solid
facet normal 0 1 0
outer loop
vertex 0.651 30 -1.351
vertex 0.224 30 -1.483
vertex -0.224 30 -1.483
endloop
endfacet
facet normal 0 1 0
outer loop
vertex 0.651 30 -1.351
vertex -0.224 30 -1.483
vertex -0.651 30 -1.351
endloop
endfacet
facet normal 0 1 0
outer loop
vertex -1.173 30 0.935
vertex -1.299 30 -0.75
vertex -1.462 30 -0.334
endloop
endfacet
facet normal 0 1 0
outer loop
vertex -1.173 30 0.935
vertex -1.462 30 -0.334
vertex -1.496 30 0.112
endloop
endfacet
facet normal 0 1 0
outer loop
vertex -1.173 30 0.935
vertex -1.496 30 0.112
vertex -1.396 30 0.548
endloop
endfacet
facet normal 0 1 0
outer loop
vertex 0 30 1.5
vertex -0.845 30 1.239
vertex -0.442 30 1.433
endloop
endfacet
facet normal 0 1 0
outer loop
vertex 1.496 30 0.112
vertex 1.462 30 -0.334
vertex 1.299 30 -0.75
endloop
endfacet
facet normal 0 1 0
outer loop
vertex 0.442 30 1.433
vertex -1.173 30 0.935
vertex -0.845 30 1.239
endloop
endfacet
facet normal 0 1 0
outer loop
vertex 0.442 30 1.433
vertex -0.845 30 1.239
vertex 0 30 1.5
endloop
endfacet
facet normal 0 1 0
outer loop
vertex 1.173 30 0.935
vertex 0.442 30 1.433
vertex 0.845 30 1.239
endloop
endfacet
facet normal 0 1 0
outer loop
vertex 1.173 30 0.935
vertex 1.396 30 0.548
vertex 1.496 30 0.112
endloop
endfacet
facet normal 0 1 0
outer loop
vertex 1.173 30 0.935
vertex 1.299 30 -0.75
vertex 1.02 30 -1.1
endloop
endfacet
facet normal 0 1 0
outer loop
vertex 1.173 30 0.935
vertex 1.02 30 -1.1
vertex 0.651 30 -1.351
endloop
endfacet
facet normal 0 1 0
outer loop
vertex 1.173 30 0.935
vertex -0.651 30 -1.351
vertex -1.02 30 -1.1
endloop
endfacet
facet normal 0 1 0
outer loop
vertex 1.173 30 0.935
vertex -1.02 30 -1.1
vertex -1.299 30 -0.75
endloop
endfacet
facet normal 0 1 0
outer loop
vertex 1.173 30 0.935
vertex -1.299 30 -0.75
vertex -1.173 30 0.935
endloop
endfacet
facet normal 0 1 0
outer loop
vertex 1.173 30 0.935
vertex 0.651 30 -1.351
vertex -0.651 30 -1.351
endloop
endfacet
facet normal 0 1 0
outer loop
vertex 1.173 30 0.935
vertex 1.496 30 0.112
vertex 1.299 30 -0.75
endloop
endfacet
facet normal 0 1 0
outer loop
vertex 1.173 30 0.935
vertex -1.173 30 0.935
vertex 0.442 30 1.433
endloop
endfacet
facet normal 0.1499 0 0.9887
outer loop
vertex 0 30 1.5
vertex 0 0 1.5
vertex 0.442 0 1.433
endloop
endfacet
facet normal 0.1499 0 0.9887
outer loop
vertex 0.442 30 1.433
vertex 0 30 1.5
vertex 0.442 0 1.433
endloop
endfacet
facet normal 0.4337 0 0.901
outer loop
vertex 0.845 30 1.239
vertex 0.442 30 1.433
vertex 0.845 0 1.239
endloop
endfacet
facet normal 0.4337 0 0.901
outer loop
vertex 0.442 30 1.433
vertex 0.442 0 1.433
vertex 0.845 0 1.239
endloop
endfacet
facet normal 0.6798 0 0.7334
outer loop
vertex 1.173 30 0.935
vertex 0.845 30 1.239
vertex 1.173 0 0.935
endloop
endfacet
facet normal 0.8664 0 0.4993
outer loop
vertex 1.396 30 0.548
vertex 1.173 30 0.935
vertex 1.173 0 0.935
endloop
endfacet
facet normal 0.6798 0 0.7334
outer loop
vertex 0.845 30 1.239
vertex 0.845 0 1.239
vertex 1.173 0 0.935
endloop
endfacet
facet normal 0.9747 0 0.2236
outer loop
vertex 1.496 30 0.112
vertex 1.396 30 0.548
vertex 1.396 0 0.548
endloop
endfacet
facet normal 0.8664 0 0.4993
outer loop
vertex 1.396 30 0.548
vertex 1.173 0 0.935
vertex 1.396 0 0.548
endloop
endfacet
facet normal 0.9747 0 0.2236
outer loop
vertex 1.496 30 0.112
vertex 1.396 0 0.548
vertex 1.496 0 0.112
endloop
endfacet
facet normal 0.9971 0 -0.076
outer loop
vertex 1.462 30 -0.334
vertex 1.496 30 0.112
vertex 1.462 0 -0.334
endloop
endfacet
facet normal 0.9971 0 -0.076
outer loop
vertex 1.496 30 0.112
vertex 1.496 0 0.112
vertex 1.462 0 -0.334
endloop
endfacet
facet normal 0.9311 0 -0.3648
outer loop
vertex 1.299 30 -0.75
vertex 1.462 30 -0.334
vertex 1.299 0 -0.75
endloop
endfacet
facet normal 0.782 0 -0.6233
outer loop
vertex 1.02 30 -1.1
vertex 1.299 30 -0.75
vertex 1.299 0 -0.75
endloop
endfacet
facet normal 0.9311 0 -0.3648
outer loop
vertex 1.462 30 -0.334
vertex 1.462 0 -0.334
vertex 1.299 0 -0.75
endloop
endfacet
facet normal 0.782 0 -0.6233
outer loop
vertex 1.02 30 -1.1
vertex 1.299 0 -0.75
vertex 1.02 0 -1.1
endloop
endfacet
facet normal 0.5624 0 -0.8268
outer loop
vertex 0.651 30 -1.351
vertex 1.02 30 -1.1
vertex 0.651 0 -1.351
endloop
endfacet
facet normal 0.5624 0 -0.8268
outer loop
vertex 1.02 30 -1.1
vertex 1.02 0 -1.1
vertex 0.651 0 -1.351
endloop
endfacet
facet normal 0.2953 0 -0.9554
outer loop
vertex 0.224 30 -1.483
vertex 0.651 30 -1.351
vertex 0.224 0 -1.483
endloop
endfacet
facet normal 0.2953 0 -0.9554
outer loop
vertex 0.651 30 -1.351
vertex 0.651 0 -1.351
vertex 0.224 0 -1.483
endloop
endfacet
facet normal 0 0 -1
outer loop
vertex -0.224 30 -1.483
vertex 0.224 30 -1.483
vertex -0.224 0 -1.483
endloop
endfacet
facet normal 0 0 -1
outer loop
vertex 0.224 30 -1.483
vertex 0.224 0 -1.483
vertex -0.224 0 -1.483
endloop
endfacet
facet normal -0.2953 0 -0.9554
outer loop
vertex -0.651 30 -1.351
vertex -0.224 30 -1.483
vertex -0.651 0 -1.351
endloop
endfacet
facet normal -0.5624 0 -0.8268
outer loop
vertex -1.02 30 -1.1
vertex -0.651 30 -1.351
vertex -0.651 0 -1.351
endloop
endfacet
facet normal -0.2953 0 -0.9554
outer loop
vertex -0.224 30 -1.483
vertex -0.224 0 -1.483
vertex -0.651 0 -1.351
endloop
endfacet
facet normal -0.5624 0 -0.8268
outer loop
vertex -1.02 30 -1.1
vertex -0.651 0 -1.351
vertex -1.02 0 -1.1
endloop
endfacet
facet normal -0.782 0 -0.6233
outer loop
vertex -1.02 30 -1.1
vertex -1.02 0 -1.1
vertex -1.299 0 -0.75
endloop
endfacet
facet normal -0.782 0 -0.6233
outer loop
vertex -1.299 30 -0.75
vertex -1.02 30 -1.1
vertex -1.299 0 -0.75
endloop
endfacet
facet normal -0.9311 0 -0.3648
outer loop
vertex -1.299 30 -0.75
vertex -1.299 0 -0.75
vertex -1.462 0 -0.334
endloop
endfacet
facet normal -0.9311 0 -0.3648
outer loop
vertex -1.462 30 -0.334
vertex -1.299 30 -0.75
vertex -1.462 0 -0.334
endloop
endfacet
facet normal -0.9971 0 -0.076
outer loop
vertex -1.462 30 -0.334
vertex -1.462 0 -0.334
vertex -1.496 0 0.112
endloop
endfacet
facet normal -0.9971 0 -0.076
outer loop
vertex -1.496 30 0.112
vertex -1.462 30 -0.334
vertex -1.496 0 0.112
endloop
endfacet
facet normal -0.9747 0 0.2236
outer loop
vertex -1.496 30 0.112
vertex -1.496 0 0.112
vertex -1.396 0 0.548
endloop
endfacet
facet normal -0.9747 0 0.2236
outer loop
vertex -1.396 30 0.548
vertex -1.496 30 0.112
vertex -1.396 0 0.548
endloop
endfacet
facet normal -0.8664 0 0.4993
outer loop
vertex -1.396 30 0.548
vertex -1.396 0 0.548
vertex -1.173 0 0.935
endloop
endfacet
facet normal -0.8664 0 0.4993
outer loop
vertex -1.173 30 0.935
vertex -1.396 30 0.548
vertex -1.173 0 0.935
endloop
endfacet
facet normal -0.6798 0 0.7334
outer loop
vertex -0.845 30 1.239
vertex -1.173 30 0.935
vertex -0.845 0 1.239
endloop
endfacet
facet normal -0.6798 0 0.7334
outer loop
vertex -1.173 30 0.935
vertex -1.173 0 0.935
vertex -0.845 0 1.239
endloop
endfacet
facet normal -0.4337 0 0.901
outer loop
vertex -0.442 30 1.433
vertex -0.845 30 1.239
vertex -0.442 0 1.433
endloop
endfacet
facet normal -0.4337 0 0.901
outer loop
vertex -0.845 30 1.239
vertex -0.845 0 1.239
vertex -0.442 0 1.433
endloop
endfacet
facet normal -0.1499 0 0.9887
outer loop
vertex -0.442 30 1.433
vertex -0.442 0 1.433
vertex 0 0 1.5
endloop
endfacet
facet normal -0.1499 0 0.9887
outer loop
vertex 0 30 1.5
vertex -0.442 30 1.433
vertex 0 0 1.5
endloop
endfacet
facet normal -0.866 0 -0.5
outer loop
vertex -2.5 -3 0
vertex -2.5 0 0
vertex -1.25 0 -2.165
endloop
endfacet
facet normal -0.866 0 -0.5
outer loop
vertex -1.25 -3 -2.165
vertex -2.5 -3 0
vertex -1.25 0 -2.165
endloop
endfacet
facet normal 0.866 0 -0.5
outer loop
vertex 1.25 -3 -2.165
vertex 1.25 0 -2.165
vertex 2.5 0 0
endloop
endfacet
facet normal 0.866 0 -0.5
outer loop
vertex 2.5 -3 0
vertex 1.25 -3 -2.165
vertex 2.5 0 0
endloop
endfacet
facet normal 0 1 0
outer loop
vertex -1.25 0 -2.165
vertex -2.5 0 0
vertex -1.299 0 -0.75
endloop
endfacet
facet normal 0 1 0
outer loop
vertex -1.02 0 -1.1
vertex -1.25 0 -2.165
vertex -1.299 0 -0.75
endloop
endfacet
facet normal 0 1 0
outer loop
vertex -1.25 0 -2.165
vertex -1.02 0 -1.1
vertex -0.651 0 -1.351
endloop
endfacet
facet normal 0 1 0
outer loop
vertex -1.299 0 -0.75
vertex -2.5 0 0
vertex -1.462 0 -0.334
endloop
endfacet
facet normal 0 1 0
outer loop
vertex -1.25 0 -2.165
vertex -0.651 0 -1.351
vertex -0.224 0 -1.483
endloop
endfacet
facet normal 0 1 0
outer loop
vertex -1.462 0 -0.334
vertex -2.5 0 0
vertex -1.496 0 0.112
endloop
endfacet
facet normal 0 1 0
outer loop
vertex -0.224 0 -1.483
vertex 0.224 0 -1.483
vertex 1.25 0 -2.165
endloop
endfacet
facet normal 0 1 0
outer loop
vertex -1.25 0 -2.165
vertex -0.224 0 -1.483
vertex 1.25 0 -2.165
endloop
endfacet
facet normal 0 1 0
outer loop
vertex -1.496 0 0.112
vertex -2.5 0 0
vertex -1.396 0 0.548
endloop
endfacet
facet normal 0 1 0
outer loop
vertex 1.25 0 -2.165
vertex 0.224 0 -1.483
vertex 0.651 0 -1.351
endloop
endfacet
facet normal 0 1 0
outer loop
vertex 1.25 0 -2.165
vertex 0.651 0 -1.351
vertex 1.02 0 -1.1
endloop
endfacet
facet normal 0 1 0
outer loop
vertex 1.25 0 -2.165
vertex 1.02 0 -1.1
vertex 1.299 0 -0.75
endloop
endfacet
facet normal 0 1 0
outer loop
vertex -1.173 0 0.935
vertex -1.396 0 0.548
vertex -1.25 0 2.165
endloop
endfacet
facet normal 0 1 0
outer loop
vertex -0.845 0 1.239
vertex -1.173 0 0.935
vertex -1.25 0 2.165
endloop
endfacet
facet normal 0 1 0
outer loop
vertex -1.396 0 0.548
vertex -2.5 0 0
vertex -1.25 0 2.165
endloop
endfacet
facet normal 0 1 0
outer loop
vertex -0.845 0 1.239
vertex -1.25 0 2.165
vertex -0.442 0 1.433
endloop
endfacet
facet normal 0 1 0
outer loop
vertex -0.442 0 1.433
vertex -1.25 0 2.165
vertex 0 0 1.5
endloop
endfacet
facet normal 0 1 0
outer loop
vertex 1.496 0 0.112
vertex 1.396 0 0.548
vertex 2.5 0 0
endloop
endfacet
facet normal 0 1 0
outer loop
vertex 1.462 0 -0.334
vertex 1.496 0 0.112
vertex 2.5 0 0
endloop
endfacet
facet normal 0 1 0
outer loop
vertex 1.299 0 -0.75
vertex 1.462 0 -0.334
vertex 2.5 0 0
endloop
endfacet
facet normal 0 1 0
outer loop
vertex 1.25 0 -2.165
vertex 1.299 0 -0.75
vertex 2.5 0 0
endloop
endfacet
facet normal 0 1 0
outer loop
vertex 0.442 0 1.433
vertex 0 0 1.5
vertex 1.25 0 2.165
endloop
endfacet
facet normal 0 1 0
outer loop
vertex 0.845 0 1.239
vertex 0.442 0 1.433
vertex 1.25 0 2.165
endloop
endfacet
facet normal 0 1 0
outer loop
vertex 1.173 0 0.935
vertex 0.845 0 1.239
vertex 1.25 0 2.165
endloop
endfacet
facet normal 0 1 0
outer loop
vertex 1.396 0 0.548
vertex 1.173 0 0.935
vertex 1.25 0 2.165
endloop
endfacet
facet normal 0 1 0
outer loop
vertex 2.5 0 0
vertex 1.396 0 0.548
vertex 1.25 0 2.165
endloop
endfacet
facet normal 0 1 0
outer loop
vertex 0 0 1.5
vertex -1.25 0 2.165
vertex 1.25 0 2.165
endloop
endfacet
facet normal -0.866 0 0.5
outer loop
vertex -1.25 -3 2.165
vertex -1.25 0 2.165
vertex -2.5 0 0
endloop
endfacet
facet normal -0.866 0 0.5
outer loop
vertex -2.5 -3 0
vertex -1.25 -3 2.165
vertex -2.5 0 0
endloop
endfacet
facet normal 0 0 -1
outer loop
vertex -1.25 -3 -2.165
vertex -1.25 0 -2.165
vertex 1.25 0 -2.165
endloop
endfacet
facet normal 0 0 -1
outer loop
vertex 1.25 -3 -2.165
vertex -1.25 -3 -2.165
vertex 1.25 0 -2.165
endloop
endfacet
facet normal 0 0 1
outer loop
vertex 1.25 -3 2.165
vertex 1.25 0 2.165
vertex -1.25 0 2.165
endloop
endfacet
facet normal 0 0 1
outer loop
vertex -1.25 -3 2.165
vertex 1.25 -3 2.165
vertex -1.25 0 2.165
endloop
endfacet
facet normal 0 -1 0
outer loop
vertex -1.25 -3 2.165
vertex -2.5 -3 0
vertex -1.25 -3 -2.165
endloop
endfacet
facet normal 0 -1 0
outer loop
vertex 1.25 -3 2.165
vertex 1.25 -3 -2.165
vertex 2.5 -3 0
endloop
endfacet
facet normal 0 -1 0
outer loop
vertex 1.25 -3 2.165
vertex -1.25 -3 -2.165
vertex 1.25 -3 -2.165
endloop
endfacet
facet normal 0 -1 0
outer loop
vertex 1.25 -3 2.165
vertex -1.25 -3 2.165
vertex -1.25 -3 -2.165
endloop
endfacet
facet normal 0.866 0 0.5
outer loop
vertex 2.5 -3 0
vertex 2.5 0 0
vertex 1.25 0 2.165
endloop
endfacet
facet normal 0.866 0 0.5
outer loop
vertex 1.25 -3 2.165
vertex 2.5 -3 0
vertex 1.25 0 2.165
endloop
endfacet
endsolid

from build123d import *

# Parameters (mm, degrees)
SKETCH1_R           = 1.5
BOSS_EXTRUDE1_DEPTH = 30
BOSS_EXTRUDE2_DEPTH = 3


with BuildPart() as part:
    # Sketch1 → Boss-Extrude1 (new body)
    with BuildSketch(Plane(origin=(0, 0, 0), x_dir=(1, 0, 0), z_dir=(0, 1, 0))):
        with Locations(Location((0, 0, 0), (0, 0, 270))):
            Circle(SKETCH1_R)
    extrude(amount=BOSS_EXTRUDE1_DEPTH)

    # Sketch2 → Boss-Extrude2 (add)
    with BuildSketch(Plane.XZ):
        Polygon((1.25, -2.165063509), (2.5, 0), (1.25, 2.165063509), (-1.25, 2.165063509), (-2.5, 0), (-1.25, -2.165063509), align=None)
    extrude(amount=BOSS_EXTRUDE2_DEPTH)


solid = part.part
